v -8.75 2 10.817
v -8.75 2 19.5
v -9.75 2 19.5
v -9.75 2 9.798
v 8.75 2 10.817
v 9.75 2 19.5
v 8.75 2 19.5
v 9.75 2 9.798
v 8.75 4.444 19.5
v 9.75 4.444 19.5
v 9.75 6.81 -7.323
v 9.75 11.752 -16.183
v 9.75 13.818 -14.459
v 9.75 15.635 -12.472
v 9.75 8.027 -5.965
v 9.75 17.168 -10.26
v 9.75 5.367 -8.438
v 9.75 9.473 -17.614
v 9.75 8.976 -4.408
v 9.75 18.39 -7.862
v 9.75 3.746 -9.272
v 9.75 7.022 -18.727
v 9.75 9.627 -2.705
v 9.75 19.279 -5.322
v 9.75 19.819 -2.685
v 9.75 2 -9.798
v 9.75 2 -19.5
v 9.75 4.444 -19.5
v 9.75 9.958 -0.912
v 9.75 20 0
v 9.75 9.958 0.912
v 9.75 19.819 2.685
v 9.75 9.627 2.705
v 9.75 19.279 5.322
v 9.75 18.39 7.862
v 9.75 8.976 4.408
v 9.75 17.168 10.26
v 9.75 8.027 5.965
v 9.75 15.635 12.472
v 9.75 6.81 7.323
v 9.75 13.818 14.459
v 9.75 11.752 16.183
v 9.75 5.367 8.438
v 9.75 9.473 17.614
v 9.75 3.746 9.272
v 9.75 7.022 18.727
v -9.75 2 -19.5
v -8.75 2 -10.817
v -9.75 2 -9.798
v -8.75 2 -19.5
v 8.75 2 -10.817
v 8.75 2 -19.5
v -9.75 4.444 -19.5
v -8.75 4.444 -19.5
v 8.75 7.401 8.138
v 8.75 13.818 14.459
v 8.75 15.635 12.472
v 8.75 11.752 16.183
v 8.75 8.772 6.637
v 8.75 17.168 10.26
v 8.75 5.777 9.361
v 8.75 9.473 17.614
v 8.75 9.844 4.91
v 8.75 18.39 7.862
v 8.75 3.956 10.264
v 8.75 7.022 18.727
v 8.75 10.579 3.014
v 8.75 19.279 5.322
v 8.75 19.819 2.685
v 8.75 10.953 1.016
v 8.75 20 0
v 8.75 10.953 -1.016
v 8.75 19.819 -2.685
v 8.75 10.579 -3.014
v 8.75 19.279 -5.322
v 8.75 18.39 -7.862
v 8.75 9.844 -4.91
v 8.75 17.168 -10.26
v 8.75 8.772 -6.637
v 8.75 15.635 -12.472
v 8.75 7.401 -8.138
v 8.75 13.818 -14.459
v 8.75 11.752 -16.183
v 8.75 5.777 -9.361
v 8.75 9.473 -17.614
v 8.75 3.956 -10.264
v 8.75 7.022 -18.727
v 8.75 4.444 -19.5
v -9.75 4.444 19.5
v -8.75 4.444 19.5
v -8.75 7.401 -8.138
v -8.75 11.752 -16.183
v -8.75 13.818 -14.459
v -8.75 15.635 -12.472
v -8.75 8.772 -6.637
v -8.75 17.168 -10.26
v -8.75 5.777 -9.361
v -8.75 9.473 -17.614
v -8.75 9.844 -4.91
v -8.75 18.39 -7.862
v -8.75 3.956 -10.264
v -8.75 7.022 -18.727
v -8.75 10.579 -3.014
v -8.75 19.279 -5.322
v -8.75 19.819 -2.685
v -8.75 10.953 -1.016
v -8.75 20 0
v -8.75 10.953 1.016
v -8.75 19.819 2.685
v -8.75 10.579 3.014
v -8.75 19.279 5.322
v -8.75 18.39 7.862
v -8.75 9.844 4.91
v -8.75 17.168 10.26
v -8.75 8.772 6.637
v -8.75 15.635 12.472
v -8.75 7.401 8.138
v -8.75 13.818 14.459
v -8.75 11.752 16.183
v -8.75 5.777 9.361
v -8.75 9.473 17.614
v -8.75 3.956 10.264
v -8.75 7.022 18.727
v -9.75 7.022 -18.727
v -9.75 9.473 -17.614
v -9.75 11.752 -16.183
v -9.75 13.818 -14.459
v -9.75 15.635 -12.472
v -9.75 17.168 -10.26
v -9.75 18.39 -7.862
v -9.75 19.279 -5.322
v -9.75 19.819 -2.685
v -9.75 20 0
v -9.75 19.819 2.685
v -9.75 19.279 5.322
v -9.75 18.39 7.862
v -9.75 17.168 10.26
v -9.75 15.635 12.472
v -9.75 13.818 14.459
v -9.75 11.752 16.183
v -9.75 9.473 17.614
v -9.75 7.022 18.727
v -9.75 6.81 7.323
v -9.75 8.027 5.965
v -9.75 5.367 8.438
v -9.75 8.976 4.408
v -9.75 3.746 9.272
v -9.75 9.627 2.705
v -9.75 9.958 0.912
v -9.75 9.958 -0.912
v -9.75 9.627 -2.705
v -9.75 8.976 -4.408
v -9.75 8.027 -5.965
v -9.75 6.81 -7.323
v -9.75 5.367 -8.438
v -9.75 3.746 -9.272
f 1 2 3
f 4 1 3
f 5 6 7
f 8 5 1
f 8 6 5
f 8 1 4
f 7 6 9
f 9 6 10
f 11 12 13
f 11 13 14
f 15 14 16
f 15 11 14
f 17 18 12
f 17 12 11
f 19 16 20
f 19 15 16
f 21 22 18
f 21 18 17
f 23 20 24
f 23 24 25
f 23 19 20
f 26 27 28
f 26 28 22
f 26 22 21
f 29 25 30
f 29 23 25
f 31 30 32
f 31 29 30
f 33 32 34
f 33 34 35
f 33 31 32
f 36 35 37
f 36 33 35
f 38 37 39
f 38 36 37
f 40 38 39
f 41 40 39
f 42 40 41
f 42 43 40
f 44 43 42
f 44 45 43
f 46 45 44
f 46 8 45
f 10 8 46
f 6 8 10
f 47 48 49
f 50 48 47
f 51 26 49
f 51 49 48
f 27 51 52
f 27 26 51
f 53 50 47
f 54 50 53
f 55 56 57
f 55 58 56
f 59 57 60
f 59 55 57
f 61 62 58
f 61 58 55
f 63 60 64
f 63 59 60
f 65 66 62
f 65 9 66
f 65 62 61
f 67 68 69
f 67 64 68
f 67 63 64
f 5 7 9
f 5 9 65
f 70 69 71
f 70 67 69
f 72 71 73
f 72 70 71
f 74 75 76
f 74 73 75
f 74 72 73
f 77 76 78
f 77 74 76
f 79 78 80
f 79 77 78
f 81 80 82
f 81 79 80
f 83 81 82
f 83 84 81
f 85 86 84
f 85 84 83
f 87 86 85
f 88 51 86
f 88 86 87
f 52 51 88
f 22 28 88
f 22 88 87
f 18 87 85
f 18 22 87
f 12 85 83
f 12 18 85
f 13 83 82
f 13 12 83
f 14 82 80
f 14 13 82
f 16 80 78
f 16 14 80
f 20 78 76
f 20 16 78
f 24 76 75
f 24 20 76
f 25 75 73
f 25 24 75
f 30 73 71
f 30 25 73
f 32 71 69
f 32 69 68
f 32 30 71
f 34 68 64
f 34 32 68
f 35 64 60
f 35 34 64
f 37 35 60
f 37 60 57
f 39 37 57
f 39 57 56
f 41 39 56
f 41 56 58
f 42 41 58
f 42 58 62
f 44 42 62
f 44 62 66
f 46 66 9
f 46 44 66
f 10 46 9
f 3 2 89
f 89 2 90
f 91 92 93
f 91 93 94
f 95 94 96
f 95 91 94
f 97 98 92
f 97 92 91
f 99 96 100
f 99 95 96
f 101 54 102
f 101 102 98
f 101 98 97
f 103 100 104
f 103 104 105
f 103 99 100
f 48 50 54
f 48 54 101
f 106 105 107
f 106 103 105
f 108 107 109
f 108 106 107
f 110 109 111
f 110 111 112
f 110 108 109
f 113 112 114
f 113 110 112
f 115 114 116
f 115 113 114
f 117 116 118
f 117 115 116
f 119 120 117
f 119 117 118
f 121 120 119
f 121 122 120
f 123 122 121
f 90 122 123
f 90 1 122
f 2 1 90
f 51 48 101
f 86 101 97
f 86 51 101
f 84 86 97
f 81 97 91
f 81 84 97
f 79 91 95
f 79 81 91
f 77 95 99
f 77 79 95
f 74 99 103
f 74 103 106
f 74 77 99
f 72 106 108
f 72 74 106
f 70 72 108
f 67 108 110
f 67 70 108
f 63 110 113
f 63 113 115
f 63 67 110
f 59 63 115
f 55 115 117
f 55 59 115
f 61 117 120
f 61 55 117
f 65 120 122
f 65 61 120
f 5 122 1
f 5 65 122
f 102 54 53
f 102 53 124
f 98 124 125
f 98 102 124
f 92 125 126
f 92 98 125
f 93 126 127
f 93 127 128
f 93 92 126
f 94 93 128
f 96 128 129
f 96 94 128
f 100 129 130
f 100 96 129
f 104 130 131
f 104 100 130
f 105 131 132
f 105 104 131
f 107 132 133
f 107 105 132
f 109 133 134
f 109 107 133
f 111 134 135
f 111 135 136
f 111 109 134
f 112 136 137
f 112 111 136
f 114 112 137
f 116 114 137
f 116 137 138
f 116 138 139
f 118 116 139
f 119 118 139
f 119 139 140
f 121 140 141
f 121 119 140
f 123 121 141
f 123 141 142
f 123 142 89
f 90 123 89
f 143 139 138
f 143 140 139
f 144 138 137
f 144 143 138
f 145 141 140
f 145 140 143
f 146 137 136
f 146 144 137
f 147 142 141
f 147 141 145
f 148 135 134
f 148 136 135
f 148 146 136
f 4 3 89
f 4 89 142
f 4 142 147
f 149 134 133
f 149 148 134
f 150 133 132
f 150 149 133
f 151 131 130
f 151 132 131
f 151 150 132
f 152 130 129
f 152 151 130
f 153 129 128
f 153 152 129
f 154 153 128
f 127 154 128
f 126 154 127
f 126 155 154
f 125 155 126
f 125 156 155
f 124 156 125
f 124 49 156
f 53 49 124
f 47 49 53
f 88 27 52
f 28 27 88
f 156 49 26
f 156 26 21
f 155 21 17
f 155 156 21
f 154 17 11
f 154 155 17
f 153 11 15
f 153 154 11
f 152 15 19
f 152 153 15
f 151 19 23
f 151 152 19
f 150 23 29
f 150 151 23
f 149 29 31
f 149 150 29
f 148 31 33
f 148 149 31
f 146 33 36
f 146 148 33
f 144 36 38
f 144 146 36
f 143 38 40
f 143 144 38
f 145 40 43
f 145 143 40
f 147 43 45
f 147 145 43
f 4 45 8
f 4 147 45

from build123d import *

# Parameters (mm, degrees)
SKETCH_2_W          = 51.075539497
SKETCH_2_H          = 30.123383878
CUT_EXTRUDE_1_DEPTH = 40
SKETCH_3_W          = 2.341501377
SKETCH_3_H          = 8.048910983
SKETCH_3_W_2        = 1.756126033
SKETCH_3_H_2        = 6.841574336
CUT_EXTRUDE_2_DEPTH = 20


with BuildPart() as part:
    # Эскиз1 → Повернуть1 (revolve)
    with BuildSketch(Plane.XY, mode=Mode.PRIVATE) as revolve_1_sk:
        Polygon((-9.75, 20), (-8.75, 20), (-8.75, 11), (8.75, 11), (8.75, 20), (9.75, 20), (9.75, 10), (-9.75, 10), align=None)
    revolve(revolve_1_sk.sketch.rotate(Axis((-17.336723769, 0, 0), (1, 0, 0)), 90), axis=Axis((-17.336723769, 0, 0), (1, 0, 0)))

    # Эскиз2 → Вырез-Вытянуть1 (cut)
    with BuildSketch(Plane(origin=(9.75, 0, 0), x_dir=(0, 0, -1), z_dir=(1, 0, 0))):
        with Locations((-1.37941238, -13.061691939)):
            Rectangle(SKETCH_2_W, SKETCH_2_H)
    extrude(amount=-CUT_EXTRUDE_1_DEPTH, mode=Mode.SUBTRACT)

    # Эскиз3 → Вырез-Вытянуть2 (cut)
    with BuildSketch(Plane(origin=(9.75, 0, 0), x_dir=(0, 0, -1), z_dir=(1, 0, 0))):
        with Locations((-20.670750689, 2.548643467)):
            Rectangle(SKETCH_3_W, SKETCH_3_H)
        with Locations((20.378063017, 2.310834734)):
            Rectangle(SKETCH_3_W_2, SKETCH_3_H_2)
    extrude(amount=-CUT_EXTRUDE_2_DEPTH, mode=Mode.SUBTRACT)


solid = part.part
